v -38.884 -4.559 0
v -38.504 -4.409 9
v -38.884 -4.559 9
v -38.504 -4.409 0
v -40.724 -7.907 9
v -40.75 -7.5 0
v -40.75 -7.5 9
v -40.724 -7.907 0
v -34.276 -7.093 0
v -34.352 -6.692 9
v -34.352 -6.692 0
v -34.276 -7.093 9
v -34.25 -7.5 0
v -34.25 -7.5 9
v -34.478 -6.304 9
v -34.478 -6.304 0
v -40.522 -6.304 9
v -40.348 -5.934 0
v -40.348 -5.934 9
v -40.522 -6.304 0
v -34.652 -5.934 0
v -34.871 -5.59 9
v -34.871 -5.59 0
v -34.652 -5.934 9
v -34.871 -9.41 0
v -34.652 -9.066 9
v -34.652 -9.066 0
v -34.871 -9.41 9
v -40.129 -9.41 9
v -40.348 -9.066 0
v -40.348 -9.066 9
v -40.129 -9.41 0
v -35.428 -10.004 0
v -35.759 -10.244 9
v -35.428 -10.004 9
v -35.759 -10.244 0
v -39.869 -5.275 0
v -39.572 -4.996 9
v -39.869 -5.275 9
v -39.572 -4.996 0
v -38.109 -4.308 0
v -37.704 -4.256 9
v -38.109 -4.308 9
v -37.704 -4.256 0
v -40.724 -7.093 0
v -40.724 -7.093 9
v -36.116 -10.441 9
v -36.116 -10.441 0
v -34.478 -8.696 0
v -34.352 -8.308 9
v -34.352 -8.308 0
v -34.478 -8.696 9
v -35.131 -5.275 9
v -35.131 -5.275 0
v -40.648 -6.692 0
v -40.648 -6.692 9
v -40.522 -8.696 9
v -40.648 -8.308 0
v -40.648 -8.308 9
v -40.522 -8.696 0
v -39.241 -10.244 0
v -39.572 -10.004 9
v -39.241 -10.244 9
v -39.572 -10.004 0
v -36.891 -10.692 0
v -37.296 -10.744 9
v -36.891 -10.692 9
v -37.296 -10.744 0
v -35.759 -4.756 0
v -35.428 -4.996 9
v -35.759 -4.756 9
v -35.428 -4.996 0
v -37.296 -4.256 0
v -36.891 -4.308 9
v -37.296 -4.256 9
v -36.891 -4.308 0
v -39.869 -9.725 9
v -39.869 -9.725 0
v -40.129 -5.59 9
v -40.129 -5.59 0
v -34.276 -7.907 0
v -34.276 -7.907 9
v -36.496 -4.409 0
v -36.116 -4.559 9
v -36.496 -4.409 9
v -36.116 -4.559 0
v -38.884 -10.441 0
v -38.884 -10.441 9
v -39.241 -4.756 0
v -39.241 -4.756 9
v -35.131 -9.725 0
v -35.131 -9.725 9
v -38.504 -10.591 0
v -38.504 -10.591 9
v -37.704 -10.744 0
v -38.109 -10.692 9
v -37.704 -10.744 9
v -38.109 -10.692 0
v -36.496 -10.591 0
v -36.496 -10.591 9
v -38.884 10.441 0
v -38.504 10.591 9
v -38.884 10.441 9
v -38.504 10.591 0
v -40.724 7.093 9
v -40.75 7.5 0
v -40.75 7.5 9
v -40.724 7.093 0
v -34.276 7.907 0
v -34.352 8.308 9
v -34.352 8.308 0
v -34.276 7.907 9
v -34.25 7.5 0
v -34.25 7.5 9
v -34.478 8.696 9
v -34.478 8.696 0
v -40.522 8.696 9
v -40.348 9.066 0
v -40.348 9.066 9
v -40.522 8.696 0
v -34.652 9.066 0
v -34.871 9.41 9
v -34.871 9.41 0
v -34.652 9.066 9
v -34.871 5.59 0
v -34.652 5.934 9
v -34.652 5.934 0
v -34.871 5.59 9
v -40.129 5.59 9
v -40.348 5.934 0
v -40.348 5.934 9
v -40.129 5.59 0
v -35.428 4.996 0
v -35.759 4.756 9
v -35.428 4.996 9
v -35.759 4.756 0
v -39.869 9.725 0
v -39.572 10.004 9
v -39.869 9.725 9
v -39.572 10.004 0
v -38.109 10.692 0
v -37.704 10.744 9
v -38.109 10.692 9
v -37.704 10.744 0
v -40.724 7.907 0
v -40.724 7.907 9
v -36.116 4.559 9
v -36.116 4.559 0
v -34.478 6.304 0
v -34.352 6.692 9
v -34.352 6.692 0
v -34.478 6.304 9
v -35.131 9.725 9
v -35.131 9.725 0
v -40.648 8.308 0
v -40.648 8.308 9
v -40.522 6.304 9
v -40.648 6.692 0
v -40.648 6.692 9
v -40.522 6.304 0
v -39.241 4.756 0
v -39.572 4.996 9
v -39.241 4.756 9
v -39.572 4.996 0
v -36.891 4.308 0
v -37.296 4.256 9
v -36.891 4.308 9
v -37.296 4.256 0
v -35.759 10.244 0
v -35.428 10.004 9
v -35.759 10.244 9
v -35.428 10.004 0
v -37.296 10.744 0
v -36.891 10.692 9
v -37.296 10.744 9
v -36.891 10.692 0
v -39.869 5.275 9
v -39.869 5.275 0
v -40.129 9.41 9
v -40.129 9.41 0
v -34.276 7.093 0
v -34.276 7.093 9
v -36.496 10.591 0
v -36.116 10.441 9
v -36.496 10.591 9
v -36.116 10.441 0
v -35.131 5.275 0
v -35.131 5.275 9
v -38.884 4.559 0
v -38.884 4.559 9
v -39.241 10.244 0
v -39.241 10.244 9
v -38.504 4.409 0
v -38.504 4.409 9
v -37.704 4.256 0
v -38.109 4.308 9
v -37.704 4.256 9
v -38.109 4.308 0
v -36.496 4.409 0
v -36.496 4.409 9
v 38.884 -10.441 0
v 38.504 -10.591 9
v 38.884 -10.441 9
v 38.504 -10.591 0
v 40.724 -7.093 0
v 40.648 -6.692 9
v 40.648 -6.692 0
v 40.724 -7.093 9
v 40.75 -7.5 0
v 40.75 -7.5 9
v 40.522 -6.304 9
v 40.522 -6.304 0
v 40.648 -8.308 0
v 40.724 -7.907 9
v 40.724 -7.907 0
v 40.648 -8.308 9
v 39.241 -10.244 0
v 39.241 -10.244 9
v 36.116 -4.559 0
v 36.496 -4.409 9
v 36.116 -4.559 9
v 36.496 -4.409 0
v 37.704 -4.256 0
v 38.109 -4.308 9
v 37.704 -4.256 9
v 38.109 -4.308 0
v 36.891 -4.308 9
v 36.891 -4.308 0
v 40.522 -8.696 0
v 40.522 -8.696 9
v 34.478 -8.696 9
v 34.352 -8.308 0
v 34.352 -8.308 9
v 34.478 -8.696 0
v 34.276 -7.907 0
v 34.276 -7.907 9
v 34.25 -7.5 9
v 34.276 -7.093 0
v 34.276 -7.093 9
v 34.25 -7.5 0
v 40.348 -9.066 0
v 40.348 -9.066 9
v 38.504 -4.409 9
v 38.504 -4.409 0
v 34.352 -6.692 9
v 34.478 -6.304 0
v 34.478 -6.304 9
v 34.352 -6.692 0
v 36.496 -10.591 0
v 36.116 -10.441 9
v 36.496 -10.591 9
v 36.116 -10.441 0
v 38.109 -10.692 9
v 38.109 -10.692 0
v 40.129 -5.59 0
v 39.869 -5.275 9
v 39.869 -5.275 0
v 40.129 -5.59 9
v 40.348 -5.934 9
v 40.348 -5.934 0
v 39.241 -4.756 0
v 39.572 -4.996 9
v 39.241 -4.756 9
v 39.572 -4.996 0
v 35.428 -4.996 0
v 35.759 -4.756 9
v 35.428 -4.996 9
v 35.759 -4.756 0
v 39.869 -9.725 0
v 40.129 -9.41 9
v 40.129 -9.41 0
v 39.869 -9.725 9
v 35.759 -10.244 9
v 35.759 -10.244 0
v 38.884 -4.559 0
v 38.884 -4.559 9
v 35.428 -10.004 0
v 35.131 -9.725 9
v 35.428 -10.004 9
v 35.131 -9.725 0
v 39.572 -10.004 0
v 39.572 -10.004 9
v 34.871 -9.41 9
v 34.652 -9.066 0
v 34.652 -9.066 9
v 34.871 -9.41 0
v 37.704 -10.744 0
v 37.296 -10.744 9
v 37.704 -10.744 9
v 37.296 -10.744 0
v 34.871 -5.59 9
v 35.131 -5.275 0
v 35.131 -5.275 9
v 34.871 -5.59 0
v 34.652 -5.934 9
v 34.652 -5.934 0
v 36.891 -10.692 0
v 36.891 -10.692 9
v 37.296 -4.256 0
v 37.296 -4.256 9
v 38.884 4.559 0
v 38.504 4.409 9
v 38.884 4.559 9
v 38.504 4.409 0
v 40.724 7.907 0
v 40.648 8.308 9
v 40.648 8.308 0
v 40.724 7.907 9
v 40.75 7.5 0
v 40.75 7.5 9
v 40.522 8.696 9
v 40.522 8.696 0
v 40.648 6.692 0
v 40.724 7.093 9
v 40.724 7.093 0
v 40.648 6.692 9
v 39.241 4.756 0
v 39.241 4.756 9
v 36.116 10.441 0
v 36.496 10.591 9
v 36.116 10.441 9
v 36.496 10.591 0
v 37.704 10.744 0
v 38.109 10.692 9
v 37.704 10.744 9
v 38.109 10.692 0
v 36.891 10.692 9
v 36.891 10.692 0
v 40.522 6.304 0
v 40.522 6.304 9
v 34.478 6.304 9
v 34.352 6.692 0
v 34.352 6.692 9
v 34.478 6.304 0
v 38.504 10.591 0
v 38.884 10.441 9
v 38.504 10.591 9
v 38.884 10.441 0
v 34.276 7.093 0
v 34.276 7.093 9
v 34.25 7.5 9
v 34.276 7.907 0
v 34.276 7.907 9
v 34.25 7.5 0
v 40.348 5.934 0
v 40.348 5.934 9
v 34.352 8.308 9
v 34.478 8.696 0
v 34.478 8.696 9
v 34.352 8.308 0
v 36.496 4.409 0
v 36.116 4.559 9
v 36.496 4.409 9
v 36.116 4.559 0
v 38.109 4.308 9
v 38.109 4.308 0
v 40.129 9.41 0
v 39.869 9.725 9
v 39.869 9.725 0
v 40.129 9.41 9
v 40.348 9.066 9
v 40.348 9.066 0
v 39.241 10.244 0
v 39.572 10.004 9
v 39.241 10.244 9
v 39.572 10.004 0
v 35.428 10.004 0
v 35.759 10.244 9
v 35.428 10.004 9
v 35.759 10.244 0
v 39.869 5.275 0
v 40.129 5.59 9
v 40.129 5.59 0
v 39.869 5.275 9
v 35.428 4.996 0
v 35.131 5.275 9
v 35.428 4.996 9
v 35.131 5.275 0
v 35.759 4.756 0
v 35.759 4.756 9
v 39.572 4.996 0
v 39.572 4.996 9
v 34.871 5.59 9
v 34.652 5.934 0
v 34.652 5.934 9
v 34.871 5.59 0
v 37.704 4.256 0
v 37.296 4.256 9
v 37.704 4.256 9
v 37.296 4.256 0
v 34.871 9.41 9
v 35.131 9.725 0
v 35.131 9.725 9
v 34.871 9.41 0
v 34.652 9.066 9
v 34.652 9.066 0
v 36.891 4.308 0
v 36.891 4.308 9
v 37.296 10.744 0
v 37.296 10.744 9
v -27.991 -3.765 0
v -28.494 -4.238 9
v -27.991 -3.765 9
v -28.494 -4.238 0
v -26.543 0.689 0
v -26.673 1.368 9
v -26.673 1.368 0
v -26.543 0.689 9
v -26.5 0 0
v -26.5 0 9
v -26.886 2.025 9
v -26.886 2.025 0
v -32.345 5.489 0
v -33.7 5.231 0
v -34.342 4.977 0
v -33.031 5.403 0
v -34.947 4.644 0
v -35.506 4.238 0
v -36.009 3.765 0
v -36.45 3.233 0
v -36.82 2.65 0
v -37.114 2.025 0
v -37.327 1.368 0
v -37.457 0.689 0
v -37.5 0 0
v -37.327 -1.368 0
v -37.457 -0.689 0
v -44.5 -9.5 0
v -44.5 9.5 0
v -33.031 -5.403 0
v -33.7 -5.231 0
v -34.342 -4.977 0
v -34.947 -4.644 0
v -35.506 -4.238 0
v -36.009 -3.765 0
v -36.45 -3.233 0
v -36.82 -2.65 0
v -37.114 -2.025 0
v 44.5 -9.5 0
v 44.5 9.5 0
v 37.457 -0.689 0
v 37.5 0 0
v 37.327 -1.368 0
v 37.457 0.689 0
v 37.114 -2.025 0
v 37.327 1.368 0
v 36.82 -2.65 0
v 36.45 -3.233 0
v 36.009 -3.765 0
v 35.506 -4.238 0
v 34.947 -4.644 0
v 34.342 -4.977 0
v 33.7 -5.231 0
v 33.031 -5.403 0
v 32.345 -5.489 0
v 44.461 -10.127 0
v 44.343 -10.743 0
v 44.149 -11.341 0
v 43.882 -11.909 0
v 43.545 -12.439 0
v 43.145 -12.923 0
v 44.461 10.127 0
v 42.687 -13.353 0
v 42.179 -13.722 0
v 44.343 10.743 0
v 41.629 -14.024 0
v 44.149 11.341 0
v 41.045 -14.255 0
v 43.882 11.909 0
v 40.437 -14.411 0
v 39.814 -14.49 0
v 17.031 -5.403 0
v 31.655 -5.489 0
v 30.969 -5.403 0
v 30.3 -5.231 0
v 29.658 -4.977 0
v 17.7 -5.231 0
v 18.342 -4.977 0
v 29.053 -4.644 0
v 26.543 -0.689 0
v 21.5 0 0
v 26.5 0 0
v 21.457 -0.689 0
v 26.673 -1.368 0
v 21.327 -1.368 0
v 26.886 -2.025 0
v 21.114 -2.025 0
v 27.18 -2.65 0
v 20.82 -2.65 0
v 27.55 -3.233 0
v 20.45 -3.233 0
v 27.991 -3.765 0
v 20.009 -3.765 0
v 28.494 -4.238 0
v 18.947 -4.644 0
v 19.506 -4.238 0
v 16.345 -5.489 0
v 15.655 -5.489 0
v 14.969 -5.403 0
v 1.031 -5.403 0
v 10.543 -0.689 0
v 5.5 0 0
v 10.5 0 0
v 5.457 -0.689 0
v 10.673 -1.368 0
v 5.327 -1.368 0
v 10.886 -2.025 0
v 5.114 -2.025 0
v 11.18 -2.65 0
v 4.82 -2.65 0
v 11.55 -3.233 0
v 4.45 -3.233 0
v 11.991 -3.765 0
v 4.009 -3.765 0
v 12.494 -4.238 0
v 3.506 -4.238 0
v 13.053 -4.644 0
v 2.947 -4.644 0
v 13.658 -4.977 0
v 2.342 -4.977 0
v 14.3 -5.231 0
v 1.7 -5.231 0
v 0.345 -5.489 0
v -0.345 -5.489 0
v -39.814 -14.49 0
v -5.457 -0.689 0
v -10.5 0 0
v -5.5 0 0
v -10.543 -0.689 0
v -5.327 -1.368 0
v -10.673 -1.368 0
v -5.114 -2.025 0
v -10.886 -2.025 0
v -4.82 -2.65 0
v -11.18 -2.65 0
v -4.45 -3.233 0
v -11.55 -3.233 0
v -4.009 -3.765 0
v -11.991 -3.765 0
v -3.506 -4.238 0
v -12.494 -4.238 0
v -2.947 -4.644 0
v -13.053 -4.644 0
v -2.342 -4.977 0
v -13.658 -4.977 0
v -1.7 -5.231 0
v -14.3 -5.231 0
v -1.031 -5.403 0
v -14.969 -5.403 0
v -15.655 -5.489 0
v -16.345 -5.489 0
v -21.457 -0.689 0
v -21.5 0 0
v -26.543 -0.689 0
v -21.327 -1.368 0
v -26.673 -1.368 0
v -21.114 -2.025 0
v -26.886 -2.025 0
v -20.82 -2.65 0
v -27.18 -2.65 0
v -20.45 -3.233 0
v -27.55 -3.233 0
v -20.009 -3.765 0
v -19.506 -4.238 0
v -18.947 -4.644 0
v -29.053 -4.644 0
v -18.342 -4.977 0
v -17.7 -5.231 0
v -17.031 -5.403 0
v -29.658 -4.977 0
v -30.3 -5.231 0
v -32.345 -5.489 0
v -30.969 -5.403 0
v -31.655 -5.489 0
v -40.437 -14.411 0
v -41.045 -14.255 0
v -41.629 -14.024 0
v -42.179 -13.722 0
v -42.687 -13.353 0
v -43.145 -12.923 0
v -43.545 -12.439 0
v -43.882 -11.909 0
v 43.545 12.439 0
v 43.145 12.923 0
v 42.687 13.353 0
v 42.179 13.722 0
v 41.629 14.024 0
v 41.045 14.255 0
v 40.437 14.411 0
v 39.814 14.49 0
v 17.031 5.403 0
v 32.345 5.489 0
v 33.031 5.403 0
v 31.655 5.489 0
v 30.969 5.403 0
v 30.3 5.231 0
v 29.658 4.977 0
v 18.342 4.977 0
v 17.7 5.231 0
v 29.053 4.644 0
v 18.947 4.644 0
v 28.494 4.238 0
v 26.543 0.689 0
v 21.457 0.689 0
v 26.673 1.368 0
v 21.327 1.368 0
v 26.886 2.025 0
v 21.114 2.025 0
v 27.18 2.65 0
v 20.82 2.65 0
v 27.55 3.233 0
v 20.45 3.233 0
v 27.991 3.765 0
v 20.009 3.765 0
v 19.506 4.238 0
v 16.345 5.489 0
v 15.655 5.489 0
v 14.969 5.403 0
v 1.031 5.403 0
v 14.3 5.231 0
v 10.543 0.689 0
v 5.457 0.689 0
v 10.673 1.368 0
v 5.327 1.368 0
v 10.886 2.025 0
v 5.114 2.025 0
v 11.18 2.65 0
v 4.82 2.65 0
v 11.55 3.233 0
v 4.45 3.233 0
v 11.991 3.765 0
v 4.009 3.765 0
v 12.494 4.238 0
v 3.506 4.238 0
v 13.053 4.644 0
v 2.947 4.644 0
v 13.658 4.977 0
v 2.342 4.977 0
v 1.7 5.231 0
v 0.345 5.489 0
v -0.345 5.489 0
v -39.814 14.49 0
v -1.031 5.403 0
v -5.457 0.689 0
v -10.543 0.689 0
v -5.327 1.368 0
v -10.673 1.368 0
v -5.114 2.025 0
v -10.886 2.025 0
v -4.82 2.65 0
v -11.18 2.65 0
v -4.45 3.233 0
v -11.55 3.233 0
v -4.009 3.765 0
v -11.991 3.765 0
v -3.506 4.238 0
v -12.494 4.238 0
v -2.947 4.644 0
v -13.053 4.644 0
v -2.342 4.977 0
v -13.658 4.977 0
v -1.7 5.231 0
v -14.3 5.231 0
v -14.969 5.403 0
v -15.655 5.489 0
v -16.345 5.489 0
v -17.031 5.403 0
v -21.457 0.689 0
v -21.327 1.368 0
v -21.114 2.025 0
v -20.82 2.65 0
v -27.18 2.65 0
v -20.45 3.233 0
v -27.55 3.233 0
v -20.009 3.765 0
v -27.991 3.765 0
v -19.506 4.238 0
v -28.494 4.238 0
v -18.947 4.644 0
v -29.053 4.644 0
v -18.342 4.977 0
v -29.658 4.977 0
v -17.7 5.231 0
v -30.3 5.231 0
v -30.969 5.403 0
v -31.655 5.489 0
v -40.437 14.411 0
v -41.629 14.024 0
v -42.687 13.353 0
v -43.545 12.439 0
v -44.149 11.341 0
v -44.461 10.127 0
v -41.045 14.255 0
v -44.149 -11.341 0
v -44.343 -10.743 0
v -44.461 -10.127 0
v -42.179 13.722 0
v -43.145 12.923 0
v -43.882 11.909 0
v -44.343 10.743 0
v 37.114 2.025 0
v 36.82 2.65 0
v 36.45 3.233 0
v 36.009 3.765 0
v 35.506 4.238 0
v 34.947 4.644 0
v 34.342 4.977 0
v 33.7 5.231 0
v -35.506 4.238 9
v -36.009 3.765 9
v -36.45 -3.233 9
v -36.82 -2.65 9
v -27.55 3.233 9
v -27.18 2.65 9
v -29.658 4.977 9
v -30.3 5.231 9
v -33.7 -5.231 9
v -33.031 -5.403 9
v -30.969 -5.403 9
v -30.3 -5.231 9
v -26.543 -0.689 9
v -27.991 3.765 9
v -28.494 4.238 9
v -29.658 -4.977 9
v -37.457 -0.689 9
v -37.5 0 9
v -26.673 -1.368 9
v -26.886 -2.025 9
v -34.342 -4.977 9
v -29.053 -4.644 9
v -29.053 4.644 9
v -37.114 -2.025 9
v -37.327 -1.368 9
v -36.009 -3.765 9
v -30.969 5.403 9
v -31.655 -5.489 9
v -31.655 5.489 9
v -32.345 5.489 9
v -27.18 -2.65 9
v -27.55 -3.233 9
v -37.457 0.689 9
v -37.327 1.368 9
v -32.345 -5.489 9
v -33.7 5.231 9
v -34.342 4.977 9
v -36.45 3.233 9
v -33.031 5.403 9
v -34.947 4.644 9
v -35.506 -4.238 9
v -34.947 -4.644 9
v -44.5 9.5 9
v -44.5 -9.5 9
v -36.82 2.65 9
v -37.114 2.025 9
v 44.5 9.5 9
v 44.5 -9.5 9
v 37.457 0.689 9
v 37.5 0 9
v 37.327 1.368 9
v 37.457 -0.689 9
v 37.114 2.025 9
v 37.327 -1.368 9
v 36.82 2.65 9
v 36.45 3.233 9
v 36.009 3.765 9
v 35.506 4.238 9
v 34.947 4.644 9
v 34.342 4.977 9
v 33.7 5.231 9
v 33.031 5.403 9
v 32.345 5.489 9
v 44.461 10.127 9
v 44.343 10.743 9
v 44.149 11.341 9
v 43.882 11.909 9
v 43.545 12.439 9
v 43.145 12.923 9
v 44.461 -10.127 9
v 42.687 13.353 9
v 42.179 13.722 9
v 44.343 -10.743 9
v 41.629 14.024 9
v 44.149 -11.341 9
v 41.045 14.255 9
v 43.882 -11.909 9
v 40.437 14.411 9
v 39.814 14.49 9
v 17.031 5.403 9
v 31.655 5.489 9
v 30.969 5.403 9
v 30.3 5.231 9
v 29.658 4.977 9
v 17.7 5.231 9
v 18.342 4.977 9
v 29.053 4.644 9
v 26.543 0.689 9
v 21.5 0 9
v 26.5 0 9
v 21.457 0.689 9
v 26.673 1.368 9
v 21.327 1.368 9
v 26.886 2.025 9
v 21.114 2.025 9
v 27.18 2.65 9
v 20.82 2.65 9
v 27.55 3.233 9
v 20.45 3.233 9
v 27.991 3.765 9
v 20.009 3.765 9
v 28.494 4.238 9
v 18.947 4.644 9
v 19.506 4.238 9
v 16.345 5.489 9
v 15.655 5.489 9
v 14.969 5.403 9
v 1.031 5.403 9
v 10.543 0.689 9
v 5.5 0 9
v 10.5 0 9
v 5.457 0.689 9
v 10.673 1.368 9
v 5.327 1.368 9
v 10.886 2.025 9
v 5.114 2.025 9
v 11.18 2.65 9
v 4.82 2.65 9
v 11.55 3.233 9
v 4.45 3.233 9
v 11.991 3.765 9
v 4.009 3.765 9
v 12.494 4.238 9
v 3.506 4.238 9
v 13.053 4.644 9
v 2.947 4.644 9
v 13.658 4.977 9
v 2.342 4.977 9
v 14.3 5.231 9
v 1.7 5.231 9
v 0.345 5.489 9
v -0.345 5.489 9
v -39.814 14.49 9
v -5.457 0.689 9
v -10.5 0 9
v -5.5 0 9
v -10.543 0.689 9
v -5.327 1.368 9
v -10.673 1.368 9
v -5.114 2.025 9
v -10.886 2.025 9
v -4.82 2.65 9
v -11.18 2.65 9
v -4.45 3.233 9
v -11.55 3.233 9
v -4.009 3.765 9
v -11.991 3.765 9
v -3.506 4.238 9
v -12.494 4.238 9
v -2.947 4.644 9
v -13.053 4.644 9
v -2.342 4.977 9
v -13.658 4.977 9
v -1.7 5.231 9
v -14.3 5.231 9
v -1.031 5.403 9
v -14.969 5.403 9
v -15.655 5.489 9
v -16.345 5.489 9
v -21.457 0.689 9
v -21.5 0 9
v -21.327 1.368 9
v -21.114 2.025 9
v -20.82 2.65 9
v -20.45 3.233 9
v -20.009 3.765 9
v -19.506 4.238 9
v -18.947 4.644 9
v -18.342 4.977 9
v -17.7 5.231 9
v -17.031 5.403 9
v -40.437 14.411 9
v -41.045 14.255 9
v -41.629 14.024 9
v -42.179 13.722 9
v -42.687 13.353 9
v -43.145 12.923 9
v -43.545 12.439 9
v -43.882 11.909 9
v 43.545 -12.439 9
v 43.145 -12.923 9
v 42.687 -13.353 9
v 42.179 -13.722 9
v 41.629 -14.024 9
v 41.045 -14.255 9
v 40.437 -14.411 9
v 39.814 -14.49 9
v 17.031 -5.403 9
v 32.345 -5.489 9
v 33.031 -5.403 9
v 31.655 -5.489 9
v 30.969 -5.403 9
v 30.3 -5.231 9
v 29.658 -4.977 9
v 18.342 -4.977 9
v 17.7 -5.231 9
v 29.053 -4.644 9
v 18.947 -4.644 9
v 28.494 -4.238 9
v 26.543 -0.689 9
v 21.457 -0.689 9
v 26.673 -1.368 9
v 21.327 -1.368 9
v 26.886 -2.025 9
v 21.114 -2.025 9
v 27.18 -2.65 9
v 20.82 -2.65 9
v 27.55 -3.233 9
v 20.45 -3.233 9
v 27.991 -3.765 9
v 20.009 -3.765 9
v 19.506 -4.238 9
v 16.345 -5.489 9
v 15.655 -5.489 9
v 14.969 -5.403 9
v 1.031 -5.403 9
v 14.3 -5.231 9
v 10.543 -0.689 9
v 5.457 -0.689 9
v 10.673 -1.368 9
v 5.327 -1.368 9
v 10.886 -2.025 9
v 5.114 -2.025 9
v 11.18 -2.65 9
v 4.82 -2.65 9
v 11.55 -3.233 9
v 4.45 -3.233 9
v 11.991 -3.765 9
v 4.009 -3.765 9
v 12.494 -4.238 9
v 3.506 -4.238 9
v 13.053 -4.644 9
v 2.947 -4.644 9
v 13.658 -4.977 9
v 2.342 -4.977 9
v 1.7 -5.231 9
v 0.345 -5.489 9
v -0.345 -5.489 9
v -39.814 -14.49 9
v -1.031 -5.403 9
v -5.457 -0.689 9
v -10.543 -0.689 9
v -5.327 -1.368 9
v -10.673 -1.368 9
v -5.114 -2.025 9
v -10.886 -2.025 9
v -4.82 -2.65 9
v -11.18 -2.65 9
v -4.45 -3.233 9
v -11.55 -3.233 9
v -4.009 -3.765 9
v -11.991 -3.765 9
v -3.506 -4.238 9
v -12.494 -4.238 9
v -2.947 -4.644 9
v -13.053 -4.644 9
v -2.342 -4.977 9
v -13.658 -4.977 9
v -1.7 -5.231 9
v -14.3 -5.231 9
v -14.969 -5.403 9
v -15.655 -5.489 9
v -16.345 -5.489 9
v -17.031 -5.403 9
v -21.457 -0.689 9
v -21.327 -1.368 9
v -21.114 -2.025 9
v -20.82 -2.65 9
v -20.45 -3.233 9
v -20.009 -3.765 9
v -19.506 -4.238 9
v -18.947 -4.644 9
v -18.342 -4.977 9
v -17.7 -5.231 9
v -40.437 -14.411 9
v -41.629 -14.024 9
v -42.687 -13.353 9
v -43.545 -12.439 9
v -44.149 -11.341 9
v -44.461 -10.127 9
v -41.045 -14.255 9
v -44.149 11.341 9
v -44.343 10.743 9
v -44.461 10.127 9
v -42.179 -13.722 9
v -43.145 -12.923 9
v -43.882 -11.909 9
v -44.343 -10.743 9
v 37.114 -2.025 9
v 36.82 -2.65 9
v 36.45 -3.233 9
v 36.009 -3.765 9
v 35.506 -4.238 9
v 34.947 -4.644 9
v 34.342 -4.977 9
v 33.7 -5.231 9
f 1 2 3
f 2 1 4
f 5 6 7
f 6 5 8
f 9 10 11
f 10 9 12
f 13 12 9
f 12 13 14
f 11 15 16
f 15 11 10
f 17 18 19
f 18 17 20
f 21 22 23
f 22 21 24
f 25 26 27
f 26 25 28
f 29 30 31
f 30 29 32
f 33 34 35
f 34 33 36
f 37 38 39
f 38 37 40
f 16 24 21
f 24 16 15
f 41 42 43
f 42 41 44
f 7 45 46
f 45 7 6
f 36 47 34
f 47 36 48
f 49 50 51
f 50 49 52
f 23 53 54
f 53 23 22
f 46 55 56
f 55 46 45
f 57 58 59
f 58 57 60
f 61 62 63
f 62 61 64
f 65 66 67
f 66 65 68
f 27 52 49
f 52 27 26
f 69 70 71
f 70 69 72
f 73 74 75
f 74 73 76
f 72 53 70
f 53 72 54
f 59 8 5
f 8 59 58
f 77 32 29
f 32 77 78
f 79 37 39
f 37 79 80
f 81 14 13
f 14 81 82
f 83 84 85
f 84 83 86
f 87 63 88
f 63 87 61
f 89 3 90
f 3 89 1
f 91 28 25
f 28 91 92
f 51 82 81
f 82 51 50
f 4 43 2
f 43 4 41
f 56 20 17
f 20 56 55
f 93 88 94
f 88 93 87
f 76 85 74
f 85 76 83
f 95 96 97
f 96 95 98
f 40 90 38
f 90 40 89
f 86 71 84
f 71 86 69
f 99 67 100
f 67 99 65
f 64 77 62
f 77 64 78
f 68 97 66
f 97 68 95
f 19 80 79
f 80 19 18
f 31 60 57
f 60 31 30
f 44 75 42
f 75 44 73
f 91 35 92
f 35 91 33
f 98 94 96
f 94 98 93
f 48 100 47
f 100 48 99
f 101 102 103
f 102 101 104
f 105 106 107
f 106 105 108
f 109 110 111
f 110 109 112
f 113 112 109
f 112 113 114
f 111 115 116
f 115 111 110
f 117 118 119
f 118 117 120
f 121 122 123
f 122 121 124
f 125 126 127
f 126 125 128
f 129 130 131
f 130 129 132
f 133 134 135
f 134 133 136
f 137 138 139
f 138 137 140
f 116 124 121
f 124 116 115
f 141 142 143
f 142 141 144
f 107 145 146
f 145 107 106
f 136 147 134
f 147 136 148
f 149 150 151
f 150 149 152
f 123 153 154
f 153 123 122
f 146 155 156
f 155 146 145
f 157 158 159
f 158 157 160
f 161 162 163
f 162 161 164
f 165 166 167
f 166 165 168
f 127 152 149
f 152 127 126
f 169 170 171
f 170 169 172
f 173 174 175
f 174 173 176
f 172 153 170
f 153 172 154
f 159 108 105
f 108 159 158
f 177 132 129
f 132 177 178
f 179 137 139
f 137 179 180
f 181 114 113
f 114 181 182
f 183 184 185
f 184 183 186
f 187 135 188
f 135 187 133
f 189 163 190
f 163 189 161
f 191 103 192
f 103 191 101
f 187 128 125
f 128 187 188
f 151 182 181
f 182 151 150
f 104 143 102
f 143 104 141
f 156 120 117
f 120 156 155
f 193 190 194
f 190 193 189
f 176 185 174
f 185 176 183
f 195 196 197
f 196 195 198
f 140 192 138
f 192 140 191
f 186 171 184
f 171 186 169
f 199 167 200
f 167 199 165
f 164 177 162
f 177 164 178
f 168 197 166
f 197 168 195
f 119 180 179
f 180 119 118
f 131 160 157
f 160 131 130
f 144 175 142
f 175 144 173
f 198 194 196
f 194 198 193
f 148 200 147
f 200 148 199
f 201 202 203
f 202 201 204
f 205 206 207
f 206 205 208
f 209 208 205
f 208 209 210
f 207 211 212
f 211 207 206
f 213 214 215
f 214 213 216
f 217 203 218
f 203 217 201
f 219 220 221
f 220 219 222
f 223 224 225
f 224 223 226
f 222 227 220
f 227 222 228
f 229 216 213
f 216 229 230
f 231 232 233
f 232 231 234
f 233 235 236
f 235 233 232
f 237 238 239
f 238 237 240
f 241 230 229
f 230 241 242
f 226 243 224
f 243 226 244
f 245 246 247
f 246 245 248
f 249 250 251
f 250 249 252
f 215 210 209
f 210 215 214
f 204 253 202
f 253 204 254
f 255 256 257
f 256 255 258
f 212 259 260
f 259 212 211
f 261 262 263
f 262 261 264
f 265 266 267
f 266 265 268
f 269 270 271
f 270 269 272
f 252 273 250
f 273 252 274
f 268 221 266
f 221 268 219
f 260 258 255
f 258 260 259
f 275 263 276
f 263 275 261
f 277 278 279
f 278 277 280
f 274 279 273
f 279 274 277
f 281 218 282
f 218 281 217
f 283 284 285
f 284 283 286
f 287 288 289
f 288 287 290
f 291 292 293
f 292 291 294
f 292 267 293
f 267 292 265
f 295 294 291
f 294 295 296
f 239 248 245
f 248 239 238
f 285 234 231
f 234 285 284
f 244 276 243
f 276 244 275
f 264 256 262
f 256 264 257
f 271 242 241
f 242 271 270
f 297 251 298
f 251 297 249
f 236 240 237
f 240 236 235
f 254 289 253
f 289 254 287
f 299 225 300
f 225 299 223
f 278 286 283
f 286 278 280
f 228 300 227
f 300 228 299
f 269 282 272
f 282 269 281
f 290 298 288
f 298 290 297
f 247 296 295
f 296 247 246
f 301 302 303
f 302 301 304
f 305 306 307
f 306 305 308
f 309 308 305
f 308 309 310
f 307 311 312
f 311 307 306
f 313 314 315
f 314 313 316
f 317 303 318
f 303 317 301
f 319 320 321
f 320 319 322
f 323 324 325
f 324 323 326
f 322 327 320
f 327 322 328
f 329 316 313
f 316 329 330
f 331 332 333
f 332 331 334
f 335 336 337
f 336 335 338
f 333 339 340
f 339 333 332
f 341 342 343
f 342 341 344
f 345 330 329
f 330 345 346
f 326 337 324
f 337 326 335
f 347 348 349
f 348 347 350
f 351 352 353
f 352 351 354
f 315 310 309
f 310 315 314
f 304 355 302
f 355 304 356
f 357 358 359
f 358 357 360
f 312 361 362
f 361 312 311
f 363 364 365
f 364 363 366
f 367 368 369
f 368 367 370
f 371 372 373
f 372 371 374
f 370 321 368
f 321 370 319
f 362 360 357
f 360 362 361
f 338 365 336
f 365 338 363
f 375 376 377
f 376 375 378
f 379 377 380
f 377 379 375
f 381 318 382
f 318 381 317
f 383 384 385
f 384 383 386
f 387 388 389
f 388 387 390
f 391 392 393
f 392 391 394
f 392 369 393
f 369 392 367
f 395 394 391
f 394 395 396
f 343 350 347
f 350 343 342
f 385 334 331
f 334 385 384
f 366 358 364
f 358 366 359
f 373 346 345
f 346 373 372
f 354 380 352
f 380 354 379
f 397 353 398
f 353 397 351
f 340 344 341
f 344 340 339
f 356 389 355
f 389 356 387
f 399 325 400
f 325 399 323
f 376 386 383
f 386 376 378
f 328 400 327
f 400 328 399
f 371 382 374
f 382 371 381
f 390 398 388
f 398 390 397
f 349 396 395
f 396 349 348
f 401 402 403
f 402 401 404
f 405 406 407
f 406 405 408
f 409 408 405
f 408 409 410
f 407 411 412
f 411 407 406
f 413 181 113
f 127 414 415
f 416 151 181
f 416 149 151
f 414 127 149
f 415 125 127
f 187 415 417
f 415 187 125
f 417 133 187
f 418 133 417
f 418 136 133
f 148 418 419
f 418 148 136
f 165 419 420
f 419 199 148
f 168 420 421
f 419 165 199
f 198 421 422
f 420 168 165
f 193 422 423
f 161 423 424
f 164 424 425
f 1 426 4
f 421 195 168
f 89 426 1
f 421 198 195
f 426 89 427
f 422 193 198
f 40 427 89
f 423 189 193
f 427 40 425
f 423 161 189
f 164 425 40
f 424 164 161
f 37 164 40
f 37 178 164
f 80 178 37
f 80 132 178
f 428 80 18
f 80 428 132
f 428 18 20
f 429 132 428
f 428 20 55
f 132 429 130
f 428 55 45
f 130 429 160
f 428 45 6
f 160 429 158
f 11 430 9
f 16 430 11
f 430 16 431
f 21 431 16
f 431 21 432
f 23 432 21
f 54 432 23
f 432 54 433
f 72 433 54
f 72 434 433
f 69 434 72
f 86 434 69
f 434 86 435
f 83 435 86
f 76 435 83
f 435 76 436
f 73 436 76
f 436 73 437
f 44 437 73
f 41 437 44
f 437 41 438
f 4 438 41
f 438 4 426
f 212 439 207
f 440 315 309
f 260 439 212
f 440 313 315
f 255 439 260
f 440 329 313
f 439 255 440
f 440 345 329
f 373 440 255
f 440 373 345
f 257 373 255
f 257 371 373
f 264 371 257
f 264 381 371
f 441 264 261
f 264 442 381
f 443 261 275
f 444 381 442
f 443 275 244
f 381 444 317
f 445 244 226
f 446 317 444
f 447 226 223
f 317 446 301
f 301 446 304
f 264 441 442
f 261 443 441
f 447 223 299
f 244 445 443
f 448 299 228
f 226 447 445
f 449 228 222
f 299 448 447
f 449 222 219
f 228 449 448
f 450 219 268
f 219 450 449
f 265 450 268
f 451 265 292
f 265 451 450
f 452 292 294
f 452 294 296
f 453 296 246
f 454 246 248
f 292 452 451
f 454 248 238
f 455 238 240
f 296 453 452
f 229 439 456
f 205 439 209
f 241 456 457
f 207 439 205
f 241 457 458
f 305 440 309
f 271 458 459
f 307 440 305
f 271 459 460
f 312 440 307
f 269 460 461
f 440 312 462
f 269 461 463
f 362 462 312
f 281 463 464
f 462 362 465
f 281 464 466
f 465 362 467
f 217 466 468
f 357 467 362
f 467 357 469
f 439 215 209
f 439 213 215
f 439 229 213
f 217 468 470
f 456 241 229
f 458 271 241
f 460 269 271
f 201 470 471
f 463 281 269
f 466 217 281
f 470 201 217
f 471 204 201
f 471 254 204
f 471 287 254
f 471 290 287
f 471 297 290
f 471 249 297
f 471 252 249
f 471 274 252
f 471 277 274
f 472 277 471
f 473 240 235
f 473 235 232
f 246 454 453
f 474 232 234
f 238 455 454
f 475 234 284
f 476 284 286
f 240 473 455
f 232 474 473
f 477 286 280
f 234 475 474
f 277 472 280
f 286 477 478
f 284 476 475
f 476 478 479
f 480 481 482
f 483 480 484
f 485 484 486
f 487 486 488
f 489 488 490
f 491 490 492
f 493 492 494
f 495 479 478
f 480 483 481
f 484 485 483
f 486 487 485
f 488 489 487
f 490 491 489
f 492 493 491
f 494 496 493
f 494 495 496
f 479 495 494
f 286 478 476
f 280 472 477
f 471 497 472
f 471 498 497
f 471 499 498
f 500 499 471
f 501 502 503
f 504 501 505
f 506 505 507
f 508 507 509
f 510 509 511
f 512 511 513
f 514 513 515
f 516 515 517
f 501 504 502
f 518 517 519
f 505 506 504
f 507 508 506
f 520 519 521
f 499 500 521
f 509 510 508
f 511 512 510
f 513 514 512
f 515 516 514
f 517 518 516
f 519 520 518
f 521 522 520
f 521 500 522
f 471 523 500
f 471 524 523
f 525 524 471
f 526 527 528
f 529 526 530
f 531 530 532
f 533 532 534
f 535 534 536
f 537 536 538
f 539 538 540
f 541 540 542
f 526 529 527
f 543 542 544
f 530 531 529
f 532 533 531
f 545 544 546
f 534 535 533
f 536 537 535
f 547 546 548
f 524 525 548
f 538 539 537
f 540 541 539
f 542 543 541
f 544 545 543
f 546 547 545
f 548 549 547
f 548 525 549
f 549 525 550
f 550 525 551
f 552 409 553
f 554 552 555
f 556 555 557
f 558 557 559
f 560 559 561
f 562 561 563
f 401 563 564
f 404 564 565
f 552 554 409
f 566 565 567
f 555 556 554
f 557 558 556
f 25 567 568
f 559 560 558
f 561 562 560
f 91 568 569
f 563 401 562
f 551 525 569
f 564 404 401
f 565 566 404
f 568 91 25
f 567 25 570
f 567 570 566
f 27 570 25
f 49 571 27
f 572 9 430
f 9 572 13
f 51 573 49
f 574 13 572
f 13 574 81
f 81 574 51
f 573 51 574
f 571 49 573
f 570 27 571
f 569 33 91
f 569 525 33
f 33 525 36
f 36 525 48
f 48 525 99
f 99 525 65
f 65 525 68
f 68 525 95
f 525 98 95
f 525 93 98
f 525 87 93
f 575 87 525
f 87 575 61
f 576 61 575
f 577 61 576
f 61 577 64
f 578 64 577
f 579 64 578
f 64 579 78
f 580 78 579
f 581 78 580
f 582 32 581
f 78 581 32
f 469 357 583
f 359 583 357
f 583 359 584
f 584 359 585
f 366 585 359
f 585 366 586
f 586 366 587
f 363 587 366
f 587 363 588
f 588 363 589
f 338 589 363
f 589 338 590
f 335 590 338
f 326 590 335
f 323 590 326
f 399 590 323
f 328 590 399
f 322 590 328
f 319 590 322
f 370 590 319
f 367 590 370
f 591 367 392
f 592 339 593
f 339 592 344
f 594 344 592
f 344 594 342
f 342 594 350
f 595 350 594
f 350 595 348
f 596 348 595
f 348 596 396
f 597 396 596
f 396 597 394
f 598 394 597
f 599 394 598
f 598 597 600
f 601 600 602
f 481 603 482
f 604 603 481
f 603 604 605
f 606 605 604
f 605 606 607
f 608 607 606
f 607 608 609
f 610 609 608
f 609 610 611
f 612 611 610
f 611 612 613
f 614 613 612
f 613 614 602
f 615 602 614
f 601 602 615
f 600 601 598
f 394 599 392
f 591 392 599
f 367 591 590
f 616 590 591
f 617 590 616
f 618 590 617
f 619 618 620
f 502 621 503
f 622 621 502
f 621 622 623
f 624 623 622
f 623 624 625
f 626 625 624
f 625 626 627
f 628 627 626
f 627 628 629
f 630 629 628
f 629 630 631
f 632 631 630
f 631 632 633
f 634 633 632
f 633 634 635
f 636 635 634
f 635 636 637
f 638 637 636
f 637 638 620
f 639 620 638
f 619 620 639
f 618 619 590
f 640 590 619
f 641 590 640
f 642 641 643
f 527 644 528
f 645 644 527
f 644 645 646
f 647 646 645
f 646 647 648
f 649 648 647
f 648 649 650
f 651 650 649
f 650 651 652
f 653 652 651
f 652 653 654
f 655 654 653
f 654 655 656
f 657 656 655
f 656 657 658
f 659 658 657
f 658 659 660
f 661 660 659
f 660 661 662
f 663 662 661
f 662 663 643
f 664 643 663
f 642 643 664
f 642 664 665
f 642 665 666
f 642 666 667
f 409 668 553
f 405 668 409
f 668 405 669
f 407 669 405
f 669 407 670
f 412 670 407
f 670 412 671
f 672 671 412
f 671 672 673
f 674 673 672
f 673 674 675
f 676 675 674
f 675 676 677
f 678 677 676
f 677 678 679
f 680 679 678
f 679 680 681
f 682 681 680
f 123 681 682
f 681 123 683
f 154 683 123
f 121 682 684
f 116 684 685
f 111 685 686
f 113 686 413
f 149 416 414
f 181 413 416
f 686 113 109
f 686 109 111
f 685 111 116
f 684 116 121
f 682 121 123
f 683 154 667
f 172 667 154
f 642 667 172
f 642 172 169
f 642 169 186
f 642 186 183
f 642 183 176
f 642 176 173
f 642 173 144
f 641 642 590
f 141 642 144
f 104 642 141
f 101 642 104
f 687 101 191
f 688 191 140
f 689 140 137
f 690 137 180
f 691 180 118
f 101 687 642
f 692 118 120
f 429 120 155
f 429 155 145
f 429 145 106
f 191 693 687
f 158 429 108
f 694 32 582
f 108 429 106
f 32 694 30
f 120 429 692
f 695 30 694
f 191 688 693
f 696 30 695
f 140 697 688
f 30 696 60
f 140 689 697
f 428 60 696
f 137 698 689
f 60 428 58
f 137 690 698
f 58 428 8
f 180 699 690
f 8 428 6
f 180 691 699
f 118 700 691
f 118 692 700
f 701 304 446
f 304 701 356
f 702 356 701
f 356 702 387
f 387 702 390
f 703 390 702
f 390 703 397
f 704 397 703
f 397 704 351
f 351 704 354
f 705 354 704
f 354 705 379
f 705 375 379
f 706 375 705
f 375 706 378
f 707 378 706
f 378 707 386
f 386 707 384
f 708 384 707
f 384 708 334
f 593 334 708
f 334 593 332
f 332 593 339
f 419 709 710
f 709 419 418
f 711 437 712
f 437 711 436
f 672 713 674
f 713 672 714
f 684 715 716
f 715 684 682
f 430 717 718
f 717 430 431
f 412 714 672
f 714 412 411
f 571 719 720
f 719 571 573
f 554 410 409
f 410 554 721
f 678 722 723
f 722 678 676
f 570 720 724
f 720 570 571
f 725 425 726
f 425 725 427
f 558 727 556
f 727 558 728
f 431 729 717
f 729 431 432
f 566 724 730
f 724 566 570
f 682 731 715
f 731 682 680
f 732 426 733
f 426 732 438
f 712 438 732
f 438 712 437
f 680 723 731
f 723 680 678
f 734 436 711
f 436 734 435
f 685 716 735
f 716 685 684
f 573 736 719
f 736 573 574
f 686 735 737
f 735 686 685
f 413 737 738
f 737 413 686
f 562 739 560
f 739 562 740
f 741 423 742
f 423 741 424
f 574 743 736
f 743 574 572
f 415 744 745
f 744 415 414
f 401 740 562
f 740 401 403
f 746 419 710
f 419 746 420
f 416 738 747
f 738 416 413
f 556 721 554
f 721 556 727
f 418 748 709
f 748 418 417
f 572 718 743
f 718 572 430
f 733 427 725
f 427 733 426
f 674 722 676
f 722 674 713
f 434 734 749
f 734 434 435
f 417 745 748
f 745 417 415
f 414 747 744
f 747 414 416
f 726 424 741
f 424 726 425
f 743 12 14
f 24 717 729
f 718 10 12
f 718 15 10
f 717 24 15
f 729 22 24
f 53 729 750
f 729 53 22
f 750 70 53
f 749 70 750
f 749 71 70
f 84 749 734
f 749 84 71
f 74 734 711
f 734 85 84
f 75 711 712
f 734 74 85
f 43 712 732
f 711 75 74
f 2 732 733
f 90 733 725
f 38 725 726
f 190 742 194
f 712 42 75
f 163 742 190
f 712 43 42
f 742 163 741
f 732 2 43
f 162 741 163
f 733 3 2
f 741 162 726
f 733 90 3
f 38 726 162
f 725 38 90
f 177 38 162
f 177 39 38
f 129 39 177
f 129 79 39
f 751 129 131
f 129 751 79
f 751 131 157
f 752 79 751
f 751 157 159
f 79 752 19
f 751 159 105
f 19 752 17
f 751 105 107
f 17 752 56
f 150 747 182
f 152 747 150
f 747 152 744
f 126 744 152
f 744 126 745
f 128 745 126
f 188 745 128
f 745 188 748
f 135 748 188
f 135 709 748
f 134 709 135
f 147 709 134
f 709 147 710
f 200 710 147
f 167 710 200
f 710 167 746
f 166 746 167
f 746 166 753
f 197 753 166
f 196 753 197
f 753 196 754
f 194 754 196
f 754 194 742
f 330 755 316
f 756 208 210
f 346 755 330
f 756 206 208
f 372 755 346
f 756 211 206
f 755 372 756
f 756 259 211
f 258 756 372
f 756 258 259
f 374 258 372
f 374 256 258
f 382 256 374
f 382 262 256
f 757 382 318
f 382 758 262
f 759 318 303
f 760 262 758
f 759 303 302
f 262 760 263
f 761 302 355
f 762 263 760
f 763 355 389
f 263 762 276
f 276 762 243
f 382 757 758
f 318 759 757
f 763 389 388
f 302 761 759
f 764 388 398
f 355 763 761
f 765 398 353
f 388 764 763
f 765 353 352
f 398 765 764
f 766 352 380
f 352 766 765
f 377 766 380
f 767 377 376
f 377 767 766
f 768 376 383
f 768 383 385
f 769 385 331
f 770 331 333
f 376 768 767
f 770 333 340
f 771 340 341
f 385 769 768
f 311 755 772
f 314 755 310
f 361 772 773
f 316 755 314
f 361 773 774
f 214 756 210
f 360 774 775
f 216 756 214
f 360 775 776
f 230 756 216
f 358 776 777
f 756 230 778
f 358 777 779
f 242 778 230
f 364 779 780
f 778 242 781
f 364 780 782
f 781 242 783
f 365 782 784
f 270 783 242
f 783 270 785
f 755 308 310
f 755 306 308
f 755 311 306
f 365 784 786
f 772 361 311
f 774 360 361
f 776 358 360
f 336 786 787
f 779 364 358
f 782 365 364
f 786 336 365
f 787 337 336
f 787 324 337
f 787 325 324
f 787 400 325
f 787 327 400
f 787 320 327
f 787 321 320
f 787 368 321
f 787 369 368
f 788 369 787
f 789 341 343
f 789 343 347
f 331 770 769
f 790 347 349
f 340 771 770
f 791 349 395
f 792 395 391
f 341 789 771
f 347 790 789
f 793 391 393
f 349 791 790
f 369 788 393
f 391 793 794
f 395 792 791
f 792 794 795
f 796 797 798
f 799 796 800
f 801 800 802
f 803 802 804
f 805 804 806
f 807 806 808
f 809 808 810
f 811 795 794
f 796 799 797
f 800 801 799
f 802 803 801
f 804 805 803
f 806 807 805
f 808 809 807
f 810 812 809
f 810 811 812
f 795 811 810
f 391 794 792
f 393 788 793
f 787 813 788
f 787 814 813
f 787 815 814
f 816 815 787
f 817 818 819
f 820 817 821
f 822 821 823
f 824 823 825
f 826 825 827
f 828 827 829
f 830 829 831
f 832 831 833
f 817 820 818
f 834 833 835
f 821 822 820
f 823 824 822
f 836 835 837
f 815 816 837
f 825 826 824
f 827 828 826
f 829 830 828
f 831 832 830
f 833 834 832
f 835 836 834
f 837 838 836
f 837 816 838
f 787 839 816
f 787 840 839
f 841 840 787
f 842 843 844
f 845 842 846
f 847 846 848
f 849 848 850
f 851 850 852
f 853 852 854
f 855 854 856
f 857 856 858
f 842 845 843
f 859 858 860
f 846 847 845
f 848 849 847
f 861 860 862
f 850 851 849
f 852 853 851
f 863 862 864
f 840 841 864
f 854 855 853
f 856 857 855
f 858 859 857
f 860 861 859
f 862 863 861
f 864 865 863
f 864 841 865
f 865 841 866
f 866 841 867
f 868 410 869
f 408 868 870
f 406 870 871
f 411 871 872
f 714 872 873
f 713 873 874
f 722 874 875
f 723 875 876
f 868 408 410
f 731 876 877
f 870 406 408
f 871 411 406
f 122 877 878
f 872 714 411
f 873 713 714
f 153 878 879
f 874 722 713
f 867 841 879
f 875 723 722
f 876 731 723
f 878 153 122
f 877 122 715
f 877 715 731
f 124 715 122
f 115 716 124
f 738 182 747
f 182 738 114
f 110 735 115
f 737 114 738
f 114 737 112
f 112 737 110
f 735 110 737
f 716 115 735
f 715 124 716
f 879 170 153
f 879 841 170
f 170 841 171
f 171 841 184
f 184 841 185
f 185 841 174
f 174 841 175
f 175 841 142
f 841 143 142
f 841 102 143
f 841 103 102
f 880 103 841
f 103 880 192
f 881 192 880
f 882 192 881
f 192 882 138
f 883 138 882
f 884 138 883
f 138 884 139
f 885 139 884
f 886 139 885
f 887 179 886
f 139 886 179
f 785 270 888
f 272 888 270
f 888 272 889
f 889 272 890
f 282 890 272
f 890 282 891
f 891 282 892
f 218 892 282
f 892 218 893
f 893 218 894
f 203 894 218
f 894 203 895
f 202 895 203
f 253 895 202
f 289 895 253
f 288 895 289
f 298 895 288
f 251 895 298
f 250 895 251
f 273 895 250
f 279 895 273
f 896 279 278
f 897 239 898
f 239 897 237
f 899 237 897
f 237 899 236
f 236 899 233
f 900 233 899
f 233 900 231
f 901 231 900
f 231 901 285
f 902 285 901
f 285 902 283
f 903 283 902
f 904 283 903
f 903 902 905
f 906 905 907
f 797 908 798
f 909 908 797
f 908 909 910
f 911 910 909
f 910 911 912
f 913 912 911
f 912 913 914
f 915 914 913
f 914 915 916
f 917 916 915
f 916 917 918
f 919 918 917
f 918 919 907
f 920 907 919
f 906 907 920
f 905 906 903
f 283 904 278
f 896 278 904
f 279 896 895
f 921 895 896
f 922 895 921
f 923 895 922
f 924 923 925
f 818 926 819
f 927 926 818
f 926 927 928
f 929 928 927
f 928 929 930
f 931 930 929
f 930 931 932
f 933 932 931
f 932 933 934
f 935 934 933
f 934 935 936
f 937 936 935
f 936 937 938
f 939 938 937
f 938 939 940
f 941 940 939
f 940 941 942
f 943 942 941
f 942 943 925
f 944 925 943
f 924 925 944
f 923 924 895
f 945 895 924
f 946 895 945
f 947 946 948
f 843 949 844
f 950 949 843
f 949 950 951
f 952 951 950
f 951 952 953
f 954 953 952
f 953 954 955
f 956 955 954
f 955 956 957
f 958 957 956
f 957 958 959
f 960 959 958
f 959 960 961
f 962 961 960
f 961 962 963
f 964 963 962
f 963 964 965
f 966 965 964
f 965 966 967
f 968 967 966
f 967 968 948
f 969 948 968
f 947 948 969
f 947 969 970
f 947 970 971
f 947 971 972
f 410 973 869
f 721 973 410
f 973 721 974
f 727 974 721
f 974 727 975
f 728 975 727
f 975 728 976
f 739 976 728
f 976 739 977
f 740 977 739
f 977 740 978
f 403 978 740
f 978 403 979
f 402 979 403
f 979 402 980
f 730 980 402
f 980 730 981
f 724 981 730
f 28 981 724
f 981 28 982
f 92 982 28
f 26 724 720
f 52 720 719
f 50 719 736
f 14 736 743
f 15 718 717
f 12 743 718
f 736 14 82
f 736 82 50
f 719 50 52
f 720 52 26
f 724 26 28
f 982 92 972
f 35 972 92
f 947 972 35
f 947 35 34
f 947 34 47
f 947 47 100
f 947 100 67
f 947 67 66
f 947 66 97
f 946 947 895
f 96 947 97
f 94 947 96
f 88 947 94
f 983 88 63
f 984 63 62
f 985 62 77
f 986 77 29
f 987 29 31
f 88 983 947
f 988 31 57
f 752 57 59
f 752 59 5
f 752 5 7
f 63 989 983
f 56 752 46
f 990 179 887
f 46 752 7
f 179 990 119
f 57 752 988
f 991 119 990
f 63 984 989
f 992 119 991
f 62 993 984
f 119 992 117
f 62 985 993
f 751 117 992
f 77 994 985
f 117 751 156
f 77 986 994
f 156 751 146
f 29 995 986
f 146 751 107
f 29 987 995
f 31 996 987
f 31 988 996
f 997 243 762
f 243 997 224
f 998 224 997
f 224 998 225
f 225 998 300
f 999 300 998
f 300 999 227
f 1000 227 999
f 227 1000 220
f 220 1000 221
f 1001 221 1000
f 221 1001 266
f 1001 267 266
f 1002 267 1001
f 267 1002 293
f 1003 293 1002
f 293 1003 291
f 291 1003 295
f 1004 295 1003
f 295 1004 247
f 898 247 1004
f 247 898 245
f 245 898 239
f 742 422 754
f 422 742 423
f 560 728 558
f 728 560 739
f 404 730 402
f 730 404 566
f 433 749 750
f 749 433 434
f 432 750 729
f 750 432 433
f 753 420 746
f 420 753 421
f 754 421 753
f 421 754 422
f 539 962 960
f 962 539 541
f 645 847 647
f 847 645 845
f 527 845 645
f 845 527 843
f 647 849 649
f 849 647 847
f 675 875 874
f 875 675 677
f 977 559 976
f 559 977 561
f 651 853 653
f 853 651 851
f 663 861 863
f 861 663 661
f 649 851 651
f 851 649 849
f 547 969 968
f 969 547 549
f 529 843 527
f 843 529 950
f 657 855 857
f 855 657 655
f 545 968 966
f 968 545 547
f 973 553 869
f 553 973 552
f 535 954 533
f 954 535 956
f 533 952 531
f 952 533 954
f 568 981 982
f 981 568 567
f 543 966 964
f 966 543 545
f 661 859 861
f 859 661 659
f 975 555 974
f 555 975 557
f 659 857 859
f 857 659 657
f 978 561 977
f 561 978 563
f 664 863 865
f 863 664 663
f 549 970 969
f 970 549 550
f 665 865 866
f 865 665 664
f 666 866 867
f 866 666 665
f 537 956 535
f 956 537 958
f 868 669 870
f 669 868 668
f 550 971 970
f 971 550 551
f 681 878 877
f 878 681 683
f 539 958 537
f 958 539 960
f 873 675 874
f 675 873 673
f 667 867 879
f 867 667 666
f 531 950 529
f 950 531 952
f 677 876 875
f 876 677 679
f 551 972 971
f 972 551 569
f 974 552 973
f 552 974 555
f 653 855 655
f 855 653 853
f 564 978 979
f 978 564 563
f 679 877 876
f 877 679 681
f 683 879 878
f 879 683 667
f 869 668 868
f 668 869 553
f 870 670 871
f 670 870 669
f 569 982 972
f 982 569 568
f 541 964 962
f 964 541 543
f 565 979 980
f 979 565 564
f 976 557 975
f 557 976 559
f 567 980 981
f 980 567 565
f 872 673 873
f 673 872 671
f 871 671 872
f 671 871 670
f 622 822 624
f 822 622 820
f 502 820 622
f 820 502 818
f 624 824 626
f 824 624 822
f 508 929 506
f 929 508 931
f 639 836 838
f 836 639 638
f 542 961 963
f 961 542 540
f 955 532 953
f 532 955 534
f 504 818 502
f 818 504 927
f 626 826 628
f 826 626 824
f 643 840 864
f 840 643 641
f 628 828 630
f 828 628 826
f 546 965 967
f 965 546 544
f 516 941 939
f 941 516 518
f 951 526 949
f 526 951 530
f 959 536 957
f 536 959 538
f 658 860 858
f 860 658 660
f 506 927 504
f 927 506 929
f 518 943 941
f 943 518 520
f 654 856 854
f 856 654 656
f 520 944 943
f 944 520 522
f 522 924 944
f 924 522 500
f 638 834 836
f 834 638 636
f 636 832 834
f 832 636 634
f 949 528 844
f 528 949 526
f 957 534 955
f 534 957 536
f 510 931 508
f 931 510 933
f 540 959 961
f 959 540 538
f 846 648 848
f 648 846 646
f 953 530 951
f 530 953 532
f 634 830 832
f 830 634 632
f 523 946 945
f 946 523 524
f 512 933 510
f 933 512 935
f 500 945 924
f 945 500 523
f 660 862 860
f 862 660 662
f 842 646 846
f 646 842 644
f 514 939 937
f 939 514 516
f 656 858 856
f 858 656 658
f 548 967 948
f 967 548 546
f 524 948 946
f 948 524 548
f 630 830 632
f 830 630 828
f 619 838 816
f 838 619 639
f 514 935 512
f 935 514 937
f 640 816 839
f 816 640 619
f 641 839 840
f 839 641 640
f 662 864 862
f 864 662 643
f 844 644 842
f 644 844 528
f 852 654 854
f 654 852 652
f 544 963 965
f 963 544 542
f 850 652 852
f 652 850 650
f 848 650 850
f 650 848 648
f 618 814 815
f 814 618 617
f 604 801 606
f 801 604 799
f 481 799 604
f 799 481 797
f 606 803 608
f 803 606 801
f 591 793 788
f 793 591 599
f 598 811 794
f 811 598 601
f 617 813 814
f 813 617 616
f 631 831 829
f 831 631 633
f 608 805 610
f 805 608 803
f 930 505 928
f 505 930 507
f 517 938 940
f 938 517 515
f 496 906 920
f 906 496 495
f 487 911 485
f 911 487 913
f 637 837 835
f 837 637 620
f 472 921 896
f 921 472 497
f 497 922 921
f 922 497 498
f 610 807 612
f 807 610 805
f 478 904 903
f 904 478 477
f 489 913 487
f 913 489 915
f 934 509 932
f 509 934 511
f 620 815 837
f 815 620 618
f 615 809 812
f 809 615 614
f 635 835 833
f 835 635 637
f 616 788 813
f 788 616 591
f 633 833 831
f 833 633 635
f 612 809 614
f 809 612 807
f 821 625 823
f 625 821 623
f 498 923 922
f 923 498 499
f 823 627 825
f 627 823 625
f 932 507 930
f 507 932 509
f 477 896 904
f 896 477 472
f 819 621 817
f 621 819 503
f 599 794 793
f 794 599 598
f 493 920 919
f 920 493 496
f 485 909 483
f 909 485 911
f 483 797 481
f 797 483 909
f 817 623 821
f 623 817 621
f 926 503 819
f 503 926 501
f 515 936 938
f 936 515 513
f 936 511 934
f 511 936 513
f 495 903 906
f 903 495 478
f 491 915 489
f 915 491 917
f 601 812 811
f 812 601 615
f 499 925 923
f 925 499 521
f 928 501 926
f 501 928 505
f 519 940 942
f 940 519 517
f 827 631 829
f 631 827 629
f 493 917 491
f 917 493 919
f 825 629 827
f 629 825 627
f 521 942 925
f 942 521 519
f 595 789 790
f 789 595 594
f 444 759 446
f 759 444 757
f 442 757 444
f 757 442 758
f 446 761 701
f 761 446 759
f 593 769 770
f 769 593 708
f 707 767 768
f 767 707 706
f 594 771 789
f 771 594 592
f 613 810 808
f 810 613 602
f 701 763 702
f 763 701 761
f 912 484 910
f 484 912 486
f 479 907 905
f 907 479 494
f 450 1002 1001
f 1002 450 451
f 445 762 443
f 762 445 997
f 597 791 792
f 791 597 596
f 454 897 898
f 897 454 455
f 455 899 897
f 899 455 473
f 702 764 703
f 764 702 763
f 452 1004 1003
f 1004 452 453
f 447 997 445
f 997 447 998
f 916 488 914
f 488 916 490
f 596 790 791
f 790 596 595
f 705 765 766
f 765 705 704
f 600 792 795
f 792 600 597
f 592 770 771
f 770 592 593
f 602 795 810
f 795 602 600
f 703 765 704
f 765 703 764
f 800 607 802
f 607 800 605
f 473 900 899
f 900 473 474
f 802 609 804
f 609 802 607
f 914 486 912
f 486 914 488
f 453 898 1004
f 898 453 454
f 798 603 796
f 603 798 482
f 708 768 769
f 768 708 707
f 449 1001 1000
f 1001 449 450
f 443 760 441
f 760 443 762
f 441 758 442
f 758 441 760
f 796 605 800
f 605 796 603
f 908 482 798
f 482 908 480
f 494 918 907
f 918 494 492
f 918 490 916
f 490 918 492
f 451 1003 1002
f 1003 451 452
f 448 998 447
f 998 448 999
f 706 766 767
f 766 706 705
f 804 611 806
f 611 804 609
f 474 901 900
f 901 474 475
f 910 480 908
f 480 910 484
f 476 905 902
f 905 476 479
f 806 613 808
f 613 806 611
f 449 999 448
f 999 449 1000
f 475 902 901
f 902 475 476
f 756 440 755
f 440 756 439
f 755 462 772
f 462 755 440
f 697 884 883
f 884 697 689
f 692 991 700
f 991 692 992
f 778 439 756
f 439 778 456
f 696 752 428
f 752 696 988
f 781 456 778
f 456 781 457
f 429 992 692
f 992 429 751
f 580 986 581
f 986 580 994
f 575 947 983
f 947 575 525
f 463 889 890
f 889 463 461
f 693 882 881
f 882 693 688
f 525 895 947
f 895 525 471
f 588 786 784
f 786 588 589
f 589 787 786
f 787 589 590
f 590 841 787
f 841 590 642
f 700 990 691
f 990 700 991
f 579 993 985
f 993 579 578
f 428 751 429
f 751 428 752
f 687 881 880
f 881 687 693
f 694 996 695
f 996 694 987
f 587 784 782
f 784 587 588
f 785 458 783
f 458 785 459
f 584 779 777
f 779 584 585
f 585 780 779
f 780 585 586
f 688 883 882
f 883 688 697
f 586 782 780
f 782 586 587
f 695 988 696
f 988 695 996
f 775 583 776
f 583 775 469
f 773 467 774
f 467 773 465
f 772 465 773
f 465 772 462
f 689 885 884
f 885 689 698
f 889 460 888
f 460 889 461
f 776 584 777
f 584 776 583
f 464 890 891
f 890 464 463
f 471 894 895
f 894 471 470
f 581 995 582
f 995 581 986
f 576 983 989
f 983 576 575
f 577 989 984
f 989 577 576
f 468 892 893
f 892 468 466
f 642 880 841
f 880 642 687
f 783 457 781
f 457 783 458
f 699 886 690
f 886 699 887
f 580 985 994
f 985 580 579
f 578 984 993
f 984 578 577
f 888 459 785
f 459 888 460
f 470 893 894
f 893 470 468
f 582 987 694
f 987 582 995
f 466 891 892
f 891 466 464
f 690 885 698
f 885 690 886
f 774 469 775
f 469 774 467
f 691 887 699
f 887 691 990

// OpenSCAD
$fn = 50;


difference() {
	union() {
		hull() {
			translate(v = [-39.5000000000, 9.5000000000, 0]) {
				cylinder(h = 9, r = 5);
			}
			translate(v = [39.5000000000, 9.5000000000, 0]) {
				cylinder(h = 9, r = 5);
			}
			translate(v = [-39.5000000000, -9.5000000000, 0]) {
				cylinder(h = 9, r = 5);
			}
			translate(v = [39.5000000000, -9.5000000000, 0]) {
				cylinder(h = 9, r = 5);
			}
		}
	}
	union() {
		#translate(v = [-37.5000000000, -7.5000000000, -100.0000000000]) {
			cylinder(h = 200, r = 3.2500000000);
		}
		#translate(v = [-37.5000000000, 7.5000000000, -100.0000000000]) {
			cylinder(h = 200, r = 3.2500000000);
		}
		#translate(v = [37.5000000000, -7.5000000000, -100.0000000000]) {
			cylinder(h = 200, r = 3.2500000000);
		}
		#translate(v = [37.5000000000, 7.5000000000, -100.0000000000]) {
			cylinder(h = 200, r = 3.2500000000);
		}
		#translate(v = [-32.0000000000, 0, 0]) {
			cylinder(h = 9, r = 5.5000000000);
		}
		#translate(v = [-16.0000000000, 0, 0]) {
			cylinder(h = 9, r = 5.5000000000);
		}
		#cylinder(h = 9, r = 5.5000000000);
		#translate(v = [16.0000000000, 0, 0]) {
			cylinder(h = 9, r = 5.5000000000);
		}
		#translate(v = [32.0000000000, 0, 0]) {
			cylinder(h = 9, r = 5.5000000000);
		}
	}
}
